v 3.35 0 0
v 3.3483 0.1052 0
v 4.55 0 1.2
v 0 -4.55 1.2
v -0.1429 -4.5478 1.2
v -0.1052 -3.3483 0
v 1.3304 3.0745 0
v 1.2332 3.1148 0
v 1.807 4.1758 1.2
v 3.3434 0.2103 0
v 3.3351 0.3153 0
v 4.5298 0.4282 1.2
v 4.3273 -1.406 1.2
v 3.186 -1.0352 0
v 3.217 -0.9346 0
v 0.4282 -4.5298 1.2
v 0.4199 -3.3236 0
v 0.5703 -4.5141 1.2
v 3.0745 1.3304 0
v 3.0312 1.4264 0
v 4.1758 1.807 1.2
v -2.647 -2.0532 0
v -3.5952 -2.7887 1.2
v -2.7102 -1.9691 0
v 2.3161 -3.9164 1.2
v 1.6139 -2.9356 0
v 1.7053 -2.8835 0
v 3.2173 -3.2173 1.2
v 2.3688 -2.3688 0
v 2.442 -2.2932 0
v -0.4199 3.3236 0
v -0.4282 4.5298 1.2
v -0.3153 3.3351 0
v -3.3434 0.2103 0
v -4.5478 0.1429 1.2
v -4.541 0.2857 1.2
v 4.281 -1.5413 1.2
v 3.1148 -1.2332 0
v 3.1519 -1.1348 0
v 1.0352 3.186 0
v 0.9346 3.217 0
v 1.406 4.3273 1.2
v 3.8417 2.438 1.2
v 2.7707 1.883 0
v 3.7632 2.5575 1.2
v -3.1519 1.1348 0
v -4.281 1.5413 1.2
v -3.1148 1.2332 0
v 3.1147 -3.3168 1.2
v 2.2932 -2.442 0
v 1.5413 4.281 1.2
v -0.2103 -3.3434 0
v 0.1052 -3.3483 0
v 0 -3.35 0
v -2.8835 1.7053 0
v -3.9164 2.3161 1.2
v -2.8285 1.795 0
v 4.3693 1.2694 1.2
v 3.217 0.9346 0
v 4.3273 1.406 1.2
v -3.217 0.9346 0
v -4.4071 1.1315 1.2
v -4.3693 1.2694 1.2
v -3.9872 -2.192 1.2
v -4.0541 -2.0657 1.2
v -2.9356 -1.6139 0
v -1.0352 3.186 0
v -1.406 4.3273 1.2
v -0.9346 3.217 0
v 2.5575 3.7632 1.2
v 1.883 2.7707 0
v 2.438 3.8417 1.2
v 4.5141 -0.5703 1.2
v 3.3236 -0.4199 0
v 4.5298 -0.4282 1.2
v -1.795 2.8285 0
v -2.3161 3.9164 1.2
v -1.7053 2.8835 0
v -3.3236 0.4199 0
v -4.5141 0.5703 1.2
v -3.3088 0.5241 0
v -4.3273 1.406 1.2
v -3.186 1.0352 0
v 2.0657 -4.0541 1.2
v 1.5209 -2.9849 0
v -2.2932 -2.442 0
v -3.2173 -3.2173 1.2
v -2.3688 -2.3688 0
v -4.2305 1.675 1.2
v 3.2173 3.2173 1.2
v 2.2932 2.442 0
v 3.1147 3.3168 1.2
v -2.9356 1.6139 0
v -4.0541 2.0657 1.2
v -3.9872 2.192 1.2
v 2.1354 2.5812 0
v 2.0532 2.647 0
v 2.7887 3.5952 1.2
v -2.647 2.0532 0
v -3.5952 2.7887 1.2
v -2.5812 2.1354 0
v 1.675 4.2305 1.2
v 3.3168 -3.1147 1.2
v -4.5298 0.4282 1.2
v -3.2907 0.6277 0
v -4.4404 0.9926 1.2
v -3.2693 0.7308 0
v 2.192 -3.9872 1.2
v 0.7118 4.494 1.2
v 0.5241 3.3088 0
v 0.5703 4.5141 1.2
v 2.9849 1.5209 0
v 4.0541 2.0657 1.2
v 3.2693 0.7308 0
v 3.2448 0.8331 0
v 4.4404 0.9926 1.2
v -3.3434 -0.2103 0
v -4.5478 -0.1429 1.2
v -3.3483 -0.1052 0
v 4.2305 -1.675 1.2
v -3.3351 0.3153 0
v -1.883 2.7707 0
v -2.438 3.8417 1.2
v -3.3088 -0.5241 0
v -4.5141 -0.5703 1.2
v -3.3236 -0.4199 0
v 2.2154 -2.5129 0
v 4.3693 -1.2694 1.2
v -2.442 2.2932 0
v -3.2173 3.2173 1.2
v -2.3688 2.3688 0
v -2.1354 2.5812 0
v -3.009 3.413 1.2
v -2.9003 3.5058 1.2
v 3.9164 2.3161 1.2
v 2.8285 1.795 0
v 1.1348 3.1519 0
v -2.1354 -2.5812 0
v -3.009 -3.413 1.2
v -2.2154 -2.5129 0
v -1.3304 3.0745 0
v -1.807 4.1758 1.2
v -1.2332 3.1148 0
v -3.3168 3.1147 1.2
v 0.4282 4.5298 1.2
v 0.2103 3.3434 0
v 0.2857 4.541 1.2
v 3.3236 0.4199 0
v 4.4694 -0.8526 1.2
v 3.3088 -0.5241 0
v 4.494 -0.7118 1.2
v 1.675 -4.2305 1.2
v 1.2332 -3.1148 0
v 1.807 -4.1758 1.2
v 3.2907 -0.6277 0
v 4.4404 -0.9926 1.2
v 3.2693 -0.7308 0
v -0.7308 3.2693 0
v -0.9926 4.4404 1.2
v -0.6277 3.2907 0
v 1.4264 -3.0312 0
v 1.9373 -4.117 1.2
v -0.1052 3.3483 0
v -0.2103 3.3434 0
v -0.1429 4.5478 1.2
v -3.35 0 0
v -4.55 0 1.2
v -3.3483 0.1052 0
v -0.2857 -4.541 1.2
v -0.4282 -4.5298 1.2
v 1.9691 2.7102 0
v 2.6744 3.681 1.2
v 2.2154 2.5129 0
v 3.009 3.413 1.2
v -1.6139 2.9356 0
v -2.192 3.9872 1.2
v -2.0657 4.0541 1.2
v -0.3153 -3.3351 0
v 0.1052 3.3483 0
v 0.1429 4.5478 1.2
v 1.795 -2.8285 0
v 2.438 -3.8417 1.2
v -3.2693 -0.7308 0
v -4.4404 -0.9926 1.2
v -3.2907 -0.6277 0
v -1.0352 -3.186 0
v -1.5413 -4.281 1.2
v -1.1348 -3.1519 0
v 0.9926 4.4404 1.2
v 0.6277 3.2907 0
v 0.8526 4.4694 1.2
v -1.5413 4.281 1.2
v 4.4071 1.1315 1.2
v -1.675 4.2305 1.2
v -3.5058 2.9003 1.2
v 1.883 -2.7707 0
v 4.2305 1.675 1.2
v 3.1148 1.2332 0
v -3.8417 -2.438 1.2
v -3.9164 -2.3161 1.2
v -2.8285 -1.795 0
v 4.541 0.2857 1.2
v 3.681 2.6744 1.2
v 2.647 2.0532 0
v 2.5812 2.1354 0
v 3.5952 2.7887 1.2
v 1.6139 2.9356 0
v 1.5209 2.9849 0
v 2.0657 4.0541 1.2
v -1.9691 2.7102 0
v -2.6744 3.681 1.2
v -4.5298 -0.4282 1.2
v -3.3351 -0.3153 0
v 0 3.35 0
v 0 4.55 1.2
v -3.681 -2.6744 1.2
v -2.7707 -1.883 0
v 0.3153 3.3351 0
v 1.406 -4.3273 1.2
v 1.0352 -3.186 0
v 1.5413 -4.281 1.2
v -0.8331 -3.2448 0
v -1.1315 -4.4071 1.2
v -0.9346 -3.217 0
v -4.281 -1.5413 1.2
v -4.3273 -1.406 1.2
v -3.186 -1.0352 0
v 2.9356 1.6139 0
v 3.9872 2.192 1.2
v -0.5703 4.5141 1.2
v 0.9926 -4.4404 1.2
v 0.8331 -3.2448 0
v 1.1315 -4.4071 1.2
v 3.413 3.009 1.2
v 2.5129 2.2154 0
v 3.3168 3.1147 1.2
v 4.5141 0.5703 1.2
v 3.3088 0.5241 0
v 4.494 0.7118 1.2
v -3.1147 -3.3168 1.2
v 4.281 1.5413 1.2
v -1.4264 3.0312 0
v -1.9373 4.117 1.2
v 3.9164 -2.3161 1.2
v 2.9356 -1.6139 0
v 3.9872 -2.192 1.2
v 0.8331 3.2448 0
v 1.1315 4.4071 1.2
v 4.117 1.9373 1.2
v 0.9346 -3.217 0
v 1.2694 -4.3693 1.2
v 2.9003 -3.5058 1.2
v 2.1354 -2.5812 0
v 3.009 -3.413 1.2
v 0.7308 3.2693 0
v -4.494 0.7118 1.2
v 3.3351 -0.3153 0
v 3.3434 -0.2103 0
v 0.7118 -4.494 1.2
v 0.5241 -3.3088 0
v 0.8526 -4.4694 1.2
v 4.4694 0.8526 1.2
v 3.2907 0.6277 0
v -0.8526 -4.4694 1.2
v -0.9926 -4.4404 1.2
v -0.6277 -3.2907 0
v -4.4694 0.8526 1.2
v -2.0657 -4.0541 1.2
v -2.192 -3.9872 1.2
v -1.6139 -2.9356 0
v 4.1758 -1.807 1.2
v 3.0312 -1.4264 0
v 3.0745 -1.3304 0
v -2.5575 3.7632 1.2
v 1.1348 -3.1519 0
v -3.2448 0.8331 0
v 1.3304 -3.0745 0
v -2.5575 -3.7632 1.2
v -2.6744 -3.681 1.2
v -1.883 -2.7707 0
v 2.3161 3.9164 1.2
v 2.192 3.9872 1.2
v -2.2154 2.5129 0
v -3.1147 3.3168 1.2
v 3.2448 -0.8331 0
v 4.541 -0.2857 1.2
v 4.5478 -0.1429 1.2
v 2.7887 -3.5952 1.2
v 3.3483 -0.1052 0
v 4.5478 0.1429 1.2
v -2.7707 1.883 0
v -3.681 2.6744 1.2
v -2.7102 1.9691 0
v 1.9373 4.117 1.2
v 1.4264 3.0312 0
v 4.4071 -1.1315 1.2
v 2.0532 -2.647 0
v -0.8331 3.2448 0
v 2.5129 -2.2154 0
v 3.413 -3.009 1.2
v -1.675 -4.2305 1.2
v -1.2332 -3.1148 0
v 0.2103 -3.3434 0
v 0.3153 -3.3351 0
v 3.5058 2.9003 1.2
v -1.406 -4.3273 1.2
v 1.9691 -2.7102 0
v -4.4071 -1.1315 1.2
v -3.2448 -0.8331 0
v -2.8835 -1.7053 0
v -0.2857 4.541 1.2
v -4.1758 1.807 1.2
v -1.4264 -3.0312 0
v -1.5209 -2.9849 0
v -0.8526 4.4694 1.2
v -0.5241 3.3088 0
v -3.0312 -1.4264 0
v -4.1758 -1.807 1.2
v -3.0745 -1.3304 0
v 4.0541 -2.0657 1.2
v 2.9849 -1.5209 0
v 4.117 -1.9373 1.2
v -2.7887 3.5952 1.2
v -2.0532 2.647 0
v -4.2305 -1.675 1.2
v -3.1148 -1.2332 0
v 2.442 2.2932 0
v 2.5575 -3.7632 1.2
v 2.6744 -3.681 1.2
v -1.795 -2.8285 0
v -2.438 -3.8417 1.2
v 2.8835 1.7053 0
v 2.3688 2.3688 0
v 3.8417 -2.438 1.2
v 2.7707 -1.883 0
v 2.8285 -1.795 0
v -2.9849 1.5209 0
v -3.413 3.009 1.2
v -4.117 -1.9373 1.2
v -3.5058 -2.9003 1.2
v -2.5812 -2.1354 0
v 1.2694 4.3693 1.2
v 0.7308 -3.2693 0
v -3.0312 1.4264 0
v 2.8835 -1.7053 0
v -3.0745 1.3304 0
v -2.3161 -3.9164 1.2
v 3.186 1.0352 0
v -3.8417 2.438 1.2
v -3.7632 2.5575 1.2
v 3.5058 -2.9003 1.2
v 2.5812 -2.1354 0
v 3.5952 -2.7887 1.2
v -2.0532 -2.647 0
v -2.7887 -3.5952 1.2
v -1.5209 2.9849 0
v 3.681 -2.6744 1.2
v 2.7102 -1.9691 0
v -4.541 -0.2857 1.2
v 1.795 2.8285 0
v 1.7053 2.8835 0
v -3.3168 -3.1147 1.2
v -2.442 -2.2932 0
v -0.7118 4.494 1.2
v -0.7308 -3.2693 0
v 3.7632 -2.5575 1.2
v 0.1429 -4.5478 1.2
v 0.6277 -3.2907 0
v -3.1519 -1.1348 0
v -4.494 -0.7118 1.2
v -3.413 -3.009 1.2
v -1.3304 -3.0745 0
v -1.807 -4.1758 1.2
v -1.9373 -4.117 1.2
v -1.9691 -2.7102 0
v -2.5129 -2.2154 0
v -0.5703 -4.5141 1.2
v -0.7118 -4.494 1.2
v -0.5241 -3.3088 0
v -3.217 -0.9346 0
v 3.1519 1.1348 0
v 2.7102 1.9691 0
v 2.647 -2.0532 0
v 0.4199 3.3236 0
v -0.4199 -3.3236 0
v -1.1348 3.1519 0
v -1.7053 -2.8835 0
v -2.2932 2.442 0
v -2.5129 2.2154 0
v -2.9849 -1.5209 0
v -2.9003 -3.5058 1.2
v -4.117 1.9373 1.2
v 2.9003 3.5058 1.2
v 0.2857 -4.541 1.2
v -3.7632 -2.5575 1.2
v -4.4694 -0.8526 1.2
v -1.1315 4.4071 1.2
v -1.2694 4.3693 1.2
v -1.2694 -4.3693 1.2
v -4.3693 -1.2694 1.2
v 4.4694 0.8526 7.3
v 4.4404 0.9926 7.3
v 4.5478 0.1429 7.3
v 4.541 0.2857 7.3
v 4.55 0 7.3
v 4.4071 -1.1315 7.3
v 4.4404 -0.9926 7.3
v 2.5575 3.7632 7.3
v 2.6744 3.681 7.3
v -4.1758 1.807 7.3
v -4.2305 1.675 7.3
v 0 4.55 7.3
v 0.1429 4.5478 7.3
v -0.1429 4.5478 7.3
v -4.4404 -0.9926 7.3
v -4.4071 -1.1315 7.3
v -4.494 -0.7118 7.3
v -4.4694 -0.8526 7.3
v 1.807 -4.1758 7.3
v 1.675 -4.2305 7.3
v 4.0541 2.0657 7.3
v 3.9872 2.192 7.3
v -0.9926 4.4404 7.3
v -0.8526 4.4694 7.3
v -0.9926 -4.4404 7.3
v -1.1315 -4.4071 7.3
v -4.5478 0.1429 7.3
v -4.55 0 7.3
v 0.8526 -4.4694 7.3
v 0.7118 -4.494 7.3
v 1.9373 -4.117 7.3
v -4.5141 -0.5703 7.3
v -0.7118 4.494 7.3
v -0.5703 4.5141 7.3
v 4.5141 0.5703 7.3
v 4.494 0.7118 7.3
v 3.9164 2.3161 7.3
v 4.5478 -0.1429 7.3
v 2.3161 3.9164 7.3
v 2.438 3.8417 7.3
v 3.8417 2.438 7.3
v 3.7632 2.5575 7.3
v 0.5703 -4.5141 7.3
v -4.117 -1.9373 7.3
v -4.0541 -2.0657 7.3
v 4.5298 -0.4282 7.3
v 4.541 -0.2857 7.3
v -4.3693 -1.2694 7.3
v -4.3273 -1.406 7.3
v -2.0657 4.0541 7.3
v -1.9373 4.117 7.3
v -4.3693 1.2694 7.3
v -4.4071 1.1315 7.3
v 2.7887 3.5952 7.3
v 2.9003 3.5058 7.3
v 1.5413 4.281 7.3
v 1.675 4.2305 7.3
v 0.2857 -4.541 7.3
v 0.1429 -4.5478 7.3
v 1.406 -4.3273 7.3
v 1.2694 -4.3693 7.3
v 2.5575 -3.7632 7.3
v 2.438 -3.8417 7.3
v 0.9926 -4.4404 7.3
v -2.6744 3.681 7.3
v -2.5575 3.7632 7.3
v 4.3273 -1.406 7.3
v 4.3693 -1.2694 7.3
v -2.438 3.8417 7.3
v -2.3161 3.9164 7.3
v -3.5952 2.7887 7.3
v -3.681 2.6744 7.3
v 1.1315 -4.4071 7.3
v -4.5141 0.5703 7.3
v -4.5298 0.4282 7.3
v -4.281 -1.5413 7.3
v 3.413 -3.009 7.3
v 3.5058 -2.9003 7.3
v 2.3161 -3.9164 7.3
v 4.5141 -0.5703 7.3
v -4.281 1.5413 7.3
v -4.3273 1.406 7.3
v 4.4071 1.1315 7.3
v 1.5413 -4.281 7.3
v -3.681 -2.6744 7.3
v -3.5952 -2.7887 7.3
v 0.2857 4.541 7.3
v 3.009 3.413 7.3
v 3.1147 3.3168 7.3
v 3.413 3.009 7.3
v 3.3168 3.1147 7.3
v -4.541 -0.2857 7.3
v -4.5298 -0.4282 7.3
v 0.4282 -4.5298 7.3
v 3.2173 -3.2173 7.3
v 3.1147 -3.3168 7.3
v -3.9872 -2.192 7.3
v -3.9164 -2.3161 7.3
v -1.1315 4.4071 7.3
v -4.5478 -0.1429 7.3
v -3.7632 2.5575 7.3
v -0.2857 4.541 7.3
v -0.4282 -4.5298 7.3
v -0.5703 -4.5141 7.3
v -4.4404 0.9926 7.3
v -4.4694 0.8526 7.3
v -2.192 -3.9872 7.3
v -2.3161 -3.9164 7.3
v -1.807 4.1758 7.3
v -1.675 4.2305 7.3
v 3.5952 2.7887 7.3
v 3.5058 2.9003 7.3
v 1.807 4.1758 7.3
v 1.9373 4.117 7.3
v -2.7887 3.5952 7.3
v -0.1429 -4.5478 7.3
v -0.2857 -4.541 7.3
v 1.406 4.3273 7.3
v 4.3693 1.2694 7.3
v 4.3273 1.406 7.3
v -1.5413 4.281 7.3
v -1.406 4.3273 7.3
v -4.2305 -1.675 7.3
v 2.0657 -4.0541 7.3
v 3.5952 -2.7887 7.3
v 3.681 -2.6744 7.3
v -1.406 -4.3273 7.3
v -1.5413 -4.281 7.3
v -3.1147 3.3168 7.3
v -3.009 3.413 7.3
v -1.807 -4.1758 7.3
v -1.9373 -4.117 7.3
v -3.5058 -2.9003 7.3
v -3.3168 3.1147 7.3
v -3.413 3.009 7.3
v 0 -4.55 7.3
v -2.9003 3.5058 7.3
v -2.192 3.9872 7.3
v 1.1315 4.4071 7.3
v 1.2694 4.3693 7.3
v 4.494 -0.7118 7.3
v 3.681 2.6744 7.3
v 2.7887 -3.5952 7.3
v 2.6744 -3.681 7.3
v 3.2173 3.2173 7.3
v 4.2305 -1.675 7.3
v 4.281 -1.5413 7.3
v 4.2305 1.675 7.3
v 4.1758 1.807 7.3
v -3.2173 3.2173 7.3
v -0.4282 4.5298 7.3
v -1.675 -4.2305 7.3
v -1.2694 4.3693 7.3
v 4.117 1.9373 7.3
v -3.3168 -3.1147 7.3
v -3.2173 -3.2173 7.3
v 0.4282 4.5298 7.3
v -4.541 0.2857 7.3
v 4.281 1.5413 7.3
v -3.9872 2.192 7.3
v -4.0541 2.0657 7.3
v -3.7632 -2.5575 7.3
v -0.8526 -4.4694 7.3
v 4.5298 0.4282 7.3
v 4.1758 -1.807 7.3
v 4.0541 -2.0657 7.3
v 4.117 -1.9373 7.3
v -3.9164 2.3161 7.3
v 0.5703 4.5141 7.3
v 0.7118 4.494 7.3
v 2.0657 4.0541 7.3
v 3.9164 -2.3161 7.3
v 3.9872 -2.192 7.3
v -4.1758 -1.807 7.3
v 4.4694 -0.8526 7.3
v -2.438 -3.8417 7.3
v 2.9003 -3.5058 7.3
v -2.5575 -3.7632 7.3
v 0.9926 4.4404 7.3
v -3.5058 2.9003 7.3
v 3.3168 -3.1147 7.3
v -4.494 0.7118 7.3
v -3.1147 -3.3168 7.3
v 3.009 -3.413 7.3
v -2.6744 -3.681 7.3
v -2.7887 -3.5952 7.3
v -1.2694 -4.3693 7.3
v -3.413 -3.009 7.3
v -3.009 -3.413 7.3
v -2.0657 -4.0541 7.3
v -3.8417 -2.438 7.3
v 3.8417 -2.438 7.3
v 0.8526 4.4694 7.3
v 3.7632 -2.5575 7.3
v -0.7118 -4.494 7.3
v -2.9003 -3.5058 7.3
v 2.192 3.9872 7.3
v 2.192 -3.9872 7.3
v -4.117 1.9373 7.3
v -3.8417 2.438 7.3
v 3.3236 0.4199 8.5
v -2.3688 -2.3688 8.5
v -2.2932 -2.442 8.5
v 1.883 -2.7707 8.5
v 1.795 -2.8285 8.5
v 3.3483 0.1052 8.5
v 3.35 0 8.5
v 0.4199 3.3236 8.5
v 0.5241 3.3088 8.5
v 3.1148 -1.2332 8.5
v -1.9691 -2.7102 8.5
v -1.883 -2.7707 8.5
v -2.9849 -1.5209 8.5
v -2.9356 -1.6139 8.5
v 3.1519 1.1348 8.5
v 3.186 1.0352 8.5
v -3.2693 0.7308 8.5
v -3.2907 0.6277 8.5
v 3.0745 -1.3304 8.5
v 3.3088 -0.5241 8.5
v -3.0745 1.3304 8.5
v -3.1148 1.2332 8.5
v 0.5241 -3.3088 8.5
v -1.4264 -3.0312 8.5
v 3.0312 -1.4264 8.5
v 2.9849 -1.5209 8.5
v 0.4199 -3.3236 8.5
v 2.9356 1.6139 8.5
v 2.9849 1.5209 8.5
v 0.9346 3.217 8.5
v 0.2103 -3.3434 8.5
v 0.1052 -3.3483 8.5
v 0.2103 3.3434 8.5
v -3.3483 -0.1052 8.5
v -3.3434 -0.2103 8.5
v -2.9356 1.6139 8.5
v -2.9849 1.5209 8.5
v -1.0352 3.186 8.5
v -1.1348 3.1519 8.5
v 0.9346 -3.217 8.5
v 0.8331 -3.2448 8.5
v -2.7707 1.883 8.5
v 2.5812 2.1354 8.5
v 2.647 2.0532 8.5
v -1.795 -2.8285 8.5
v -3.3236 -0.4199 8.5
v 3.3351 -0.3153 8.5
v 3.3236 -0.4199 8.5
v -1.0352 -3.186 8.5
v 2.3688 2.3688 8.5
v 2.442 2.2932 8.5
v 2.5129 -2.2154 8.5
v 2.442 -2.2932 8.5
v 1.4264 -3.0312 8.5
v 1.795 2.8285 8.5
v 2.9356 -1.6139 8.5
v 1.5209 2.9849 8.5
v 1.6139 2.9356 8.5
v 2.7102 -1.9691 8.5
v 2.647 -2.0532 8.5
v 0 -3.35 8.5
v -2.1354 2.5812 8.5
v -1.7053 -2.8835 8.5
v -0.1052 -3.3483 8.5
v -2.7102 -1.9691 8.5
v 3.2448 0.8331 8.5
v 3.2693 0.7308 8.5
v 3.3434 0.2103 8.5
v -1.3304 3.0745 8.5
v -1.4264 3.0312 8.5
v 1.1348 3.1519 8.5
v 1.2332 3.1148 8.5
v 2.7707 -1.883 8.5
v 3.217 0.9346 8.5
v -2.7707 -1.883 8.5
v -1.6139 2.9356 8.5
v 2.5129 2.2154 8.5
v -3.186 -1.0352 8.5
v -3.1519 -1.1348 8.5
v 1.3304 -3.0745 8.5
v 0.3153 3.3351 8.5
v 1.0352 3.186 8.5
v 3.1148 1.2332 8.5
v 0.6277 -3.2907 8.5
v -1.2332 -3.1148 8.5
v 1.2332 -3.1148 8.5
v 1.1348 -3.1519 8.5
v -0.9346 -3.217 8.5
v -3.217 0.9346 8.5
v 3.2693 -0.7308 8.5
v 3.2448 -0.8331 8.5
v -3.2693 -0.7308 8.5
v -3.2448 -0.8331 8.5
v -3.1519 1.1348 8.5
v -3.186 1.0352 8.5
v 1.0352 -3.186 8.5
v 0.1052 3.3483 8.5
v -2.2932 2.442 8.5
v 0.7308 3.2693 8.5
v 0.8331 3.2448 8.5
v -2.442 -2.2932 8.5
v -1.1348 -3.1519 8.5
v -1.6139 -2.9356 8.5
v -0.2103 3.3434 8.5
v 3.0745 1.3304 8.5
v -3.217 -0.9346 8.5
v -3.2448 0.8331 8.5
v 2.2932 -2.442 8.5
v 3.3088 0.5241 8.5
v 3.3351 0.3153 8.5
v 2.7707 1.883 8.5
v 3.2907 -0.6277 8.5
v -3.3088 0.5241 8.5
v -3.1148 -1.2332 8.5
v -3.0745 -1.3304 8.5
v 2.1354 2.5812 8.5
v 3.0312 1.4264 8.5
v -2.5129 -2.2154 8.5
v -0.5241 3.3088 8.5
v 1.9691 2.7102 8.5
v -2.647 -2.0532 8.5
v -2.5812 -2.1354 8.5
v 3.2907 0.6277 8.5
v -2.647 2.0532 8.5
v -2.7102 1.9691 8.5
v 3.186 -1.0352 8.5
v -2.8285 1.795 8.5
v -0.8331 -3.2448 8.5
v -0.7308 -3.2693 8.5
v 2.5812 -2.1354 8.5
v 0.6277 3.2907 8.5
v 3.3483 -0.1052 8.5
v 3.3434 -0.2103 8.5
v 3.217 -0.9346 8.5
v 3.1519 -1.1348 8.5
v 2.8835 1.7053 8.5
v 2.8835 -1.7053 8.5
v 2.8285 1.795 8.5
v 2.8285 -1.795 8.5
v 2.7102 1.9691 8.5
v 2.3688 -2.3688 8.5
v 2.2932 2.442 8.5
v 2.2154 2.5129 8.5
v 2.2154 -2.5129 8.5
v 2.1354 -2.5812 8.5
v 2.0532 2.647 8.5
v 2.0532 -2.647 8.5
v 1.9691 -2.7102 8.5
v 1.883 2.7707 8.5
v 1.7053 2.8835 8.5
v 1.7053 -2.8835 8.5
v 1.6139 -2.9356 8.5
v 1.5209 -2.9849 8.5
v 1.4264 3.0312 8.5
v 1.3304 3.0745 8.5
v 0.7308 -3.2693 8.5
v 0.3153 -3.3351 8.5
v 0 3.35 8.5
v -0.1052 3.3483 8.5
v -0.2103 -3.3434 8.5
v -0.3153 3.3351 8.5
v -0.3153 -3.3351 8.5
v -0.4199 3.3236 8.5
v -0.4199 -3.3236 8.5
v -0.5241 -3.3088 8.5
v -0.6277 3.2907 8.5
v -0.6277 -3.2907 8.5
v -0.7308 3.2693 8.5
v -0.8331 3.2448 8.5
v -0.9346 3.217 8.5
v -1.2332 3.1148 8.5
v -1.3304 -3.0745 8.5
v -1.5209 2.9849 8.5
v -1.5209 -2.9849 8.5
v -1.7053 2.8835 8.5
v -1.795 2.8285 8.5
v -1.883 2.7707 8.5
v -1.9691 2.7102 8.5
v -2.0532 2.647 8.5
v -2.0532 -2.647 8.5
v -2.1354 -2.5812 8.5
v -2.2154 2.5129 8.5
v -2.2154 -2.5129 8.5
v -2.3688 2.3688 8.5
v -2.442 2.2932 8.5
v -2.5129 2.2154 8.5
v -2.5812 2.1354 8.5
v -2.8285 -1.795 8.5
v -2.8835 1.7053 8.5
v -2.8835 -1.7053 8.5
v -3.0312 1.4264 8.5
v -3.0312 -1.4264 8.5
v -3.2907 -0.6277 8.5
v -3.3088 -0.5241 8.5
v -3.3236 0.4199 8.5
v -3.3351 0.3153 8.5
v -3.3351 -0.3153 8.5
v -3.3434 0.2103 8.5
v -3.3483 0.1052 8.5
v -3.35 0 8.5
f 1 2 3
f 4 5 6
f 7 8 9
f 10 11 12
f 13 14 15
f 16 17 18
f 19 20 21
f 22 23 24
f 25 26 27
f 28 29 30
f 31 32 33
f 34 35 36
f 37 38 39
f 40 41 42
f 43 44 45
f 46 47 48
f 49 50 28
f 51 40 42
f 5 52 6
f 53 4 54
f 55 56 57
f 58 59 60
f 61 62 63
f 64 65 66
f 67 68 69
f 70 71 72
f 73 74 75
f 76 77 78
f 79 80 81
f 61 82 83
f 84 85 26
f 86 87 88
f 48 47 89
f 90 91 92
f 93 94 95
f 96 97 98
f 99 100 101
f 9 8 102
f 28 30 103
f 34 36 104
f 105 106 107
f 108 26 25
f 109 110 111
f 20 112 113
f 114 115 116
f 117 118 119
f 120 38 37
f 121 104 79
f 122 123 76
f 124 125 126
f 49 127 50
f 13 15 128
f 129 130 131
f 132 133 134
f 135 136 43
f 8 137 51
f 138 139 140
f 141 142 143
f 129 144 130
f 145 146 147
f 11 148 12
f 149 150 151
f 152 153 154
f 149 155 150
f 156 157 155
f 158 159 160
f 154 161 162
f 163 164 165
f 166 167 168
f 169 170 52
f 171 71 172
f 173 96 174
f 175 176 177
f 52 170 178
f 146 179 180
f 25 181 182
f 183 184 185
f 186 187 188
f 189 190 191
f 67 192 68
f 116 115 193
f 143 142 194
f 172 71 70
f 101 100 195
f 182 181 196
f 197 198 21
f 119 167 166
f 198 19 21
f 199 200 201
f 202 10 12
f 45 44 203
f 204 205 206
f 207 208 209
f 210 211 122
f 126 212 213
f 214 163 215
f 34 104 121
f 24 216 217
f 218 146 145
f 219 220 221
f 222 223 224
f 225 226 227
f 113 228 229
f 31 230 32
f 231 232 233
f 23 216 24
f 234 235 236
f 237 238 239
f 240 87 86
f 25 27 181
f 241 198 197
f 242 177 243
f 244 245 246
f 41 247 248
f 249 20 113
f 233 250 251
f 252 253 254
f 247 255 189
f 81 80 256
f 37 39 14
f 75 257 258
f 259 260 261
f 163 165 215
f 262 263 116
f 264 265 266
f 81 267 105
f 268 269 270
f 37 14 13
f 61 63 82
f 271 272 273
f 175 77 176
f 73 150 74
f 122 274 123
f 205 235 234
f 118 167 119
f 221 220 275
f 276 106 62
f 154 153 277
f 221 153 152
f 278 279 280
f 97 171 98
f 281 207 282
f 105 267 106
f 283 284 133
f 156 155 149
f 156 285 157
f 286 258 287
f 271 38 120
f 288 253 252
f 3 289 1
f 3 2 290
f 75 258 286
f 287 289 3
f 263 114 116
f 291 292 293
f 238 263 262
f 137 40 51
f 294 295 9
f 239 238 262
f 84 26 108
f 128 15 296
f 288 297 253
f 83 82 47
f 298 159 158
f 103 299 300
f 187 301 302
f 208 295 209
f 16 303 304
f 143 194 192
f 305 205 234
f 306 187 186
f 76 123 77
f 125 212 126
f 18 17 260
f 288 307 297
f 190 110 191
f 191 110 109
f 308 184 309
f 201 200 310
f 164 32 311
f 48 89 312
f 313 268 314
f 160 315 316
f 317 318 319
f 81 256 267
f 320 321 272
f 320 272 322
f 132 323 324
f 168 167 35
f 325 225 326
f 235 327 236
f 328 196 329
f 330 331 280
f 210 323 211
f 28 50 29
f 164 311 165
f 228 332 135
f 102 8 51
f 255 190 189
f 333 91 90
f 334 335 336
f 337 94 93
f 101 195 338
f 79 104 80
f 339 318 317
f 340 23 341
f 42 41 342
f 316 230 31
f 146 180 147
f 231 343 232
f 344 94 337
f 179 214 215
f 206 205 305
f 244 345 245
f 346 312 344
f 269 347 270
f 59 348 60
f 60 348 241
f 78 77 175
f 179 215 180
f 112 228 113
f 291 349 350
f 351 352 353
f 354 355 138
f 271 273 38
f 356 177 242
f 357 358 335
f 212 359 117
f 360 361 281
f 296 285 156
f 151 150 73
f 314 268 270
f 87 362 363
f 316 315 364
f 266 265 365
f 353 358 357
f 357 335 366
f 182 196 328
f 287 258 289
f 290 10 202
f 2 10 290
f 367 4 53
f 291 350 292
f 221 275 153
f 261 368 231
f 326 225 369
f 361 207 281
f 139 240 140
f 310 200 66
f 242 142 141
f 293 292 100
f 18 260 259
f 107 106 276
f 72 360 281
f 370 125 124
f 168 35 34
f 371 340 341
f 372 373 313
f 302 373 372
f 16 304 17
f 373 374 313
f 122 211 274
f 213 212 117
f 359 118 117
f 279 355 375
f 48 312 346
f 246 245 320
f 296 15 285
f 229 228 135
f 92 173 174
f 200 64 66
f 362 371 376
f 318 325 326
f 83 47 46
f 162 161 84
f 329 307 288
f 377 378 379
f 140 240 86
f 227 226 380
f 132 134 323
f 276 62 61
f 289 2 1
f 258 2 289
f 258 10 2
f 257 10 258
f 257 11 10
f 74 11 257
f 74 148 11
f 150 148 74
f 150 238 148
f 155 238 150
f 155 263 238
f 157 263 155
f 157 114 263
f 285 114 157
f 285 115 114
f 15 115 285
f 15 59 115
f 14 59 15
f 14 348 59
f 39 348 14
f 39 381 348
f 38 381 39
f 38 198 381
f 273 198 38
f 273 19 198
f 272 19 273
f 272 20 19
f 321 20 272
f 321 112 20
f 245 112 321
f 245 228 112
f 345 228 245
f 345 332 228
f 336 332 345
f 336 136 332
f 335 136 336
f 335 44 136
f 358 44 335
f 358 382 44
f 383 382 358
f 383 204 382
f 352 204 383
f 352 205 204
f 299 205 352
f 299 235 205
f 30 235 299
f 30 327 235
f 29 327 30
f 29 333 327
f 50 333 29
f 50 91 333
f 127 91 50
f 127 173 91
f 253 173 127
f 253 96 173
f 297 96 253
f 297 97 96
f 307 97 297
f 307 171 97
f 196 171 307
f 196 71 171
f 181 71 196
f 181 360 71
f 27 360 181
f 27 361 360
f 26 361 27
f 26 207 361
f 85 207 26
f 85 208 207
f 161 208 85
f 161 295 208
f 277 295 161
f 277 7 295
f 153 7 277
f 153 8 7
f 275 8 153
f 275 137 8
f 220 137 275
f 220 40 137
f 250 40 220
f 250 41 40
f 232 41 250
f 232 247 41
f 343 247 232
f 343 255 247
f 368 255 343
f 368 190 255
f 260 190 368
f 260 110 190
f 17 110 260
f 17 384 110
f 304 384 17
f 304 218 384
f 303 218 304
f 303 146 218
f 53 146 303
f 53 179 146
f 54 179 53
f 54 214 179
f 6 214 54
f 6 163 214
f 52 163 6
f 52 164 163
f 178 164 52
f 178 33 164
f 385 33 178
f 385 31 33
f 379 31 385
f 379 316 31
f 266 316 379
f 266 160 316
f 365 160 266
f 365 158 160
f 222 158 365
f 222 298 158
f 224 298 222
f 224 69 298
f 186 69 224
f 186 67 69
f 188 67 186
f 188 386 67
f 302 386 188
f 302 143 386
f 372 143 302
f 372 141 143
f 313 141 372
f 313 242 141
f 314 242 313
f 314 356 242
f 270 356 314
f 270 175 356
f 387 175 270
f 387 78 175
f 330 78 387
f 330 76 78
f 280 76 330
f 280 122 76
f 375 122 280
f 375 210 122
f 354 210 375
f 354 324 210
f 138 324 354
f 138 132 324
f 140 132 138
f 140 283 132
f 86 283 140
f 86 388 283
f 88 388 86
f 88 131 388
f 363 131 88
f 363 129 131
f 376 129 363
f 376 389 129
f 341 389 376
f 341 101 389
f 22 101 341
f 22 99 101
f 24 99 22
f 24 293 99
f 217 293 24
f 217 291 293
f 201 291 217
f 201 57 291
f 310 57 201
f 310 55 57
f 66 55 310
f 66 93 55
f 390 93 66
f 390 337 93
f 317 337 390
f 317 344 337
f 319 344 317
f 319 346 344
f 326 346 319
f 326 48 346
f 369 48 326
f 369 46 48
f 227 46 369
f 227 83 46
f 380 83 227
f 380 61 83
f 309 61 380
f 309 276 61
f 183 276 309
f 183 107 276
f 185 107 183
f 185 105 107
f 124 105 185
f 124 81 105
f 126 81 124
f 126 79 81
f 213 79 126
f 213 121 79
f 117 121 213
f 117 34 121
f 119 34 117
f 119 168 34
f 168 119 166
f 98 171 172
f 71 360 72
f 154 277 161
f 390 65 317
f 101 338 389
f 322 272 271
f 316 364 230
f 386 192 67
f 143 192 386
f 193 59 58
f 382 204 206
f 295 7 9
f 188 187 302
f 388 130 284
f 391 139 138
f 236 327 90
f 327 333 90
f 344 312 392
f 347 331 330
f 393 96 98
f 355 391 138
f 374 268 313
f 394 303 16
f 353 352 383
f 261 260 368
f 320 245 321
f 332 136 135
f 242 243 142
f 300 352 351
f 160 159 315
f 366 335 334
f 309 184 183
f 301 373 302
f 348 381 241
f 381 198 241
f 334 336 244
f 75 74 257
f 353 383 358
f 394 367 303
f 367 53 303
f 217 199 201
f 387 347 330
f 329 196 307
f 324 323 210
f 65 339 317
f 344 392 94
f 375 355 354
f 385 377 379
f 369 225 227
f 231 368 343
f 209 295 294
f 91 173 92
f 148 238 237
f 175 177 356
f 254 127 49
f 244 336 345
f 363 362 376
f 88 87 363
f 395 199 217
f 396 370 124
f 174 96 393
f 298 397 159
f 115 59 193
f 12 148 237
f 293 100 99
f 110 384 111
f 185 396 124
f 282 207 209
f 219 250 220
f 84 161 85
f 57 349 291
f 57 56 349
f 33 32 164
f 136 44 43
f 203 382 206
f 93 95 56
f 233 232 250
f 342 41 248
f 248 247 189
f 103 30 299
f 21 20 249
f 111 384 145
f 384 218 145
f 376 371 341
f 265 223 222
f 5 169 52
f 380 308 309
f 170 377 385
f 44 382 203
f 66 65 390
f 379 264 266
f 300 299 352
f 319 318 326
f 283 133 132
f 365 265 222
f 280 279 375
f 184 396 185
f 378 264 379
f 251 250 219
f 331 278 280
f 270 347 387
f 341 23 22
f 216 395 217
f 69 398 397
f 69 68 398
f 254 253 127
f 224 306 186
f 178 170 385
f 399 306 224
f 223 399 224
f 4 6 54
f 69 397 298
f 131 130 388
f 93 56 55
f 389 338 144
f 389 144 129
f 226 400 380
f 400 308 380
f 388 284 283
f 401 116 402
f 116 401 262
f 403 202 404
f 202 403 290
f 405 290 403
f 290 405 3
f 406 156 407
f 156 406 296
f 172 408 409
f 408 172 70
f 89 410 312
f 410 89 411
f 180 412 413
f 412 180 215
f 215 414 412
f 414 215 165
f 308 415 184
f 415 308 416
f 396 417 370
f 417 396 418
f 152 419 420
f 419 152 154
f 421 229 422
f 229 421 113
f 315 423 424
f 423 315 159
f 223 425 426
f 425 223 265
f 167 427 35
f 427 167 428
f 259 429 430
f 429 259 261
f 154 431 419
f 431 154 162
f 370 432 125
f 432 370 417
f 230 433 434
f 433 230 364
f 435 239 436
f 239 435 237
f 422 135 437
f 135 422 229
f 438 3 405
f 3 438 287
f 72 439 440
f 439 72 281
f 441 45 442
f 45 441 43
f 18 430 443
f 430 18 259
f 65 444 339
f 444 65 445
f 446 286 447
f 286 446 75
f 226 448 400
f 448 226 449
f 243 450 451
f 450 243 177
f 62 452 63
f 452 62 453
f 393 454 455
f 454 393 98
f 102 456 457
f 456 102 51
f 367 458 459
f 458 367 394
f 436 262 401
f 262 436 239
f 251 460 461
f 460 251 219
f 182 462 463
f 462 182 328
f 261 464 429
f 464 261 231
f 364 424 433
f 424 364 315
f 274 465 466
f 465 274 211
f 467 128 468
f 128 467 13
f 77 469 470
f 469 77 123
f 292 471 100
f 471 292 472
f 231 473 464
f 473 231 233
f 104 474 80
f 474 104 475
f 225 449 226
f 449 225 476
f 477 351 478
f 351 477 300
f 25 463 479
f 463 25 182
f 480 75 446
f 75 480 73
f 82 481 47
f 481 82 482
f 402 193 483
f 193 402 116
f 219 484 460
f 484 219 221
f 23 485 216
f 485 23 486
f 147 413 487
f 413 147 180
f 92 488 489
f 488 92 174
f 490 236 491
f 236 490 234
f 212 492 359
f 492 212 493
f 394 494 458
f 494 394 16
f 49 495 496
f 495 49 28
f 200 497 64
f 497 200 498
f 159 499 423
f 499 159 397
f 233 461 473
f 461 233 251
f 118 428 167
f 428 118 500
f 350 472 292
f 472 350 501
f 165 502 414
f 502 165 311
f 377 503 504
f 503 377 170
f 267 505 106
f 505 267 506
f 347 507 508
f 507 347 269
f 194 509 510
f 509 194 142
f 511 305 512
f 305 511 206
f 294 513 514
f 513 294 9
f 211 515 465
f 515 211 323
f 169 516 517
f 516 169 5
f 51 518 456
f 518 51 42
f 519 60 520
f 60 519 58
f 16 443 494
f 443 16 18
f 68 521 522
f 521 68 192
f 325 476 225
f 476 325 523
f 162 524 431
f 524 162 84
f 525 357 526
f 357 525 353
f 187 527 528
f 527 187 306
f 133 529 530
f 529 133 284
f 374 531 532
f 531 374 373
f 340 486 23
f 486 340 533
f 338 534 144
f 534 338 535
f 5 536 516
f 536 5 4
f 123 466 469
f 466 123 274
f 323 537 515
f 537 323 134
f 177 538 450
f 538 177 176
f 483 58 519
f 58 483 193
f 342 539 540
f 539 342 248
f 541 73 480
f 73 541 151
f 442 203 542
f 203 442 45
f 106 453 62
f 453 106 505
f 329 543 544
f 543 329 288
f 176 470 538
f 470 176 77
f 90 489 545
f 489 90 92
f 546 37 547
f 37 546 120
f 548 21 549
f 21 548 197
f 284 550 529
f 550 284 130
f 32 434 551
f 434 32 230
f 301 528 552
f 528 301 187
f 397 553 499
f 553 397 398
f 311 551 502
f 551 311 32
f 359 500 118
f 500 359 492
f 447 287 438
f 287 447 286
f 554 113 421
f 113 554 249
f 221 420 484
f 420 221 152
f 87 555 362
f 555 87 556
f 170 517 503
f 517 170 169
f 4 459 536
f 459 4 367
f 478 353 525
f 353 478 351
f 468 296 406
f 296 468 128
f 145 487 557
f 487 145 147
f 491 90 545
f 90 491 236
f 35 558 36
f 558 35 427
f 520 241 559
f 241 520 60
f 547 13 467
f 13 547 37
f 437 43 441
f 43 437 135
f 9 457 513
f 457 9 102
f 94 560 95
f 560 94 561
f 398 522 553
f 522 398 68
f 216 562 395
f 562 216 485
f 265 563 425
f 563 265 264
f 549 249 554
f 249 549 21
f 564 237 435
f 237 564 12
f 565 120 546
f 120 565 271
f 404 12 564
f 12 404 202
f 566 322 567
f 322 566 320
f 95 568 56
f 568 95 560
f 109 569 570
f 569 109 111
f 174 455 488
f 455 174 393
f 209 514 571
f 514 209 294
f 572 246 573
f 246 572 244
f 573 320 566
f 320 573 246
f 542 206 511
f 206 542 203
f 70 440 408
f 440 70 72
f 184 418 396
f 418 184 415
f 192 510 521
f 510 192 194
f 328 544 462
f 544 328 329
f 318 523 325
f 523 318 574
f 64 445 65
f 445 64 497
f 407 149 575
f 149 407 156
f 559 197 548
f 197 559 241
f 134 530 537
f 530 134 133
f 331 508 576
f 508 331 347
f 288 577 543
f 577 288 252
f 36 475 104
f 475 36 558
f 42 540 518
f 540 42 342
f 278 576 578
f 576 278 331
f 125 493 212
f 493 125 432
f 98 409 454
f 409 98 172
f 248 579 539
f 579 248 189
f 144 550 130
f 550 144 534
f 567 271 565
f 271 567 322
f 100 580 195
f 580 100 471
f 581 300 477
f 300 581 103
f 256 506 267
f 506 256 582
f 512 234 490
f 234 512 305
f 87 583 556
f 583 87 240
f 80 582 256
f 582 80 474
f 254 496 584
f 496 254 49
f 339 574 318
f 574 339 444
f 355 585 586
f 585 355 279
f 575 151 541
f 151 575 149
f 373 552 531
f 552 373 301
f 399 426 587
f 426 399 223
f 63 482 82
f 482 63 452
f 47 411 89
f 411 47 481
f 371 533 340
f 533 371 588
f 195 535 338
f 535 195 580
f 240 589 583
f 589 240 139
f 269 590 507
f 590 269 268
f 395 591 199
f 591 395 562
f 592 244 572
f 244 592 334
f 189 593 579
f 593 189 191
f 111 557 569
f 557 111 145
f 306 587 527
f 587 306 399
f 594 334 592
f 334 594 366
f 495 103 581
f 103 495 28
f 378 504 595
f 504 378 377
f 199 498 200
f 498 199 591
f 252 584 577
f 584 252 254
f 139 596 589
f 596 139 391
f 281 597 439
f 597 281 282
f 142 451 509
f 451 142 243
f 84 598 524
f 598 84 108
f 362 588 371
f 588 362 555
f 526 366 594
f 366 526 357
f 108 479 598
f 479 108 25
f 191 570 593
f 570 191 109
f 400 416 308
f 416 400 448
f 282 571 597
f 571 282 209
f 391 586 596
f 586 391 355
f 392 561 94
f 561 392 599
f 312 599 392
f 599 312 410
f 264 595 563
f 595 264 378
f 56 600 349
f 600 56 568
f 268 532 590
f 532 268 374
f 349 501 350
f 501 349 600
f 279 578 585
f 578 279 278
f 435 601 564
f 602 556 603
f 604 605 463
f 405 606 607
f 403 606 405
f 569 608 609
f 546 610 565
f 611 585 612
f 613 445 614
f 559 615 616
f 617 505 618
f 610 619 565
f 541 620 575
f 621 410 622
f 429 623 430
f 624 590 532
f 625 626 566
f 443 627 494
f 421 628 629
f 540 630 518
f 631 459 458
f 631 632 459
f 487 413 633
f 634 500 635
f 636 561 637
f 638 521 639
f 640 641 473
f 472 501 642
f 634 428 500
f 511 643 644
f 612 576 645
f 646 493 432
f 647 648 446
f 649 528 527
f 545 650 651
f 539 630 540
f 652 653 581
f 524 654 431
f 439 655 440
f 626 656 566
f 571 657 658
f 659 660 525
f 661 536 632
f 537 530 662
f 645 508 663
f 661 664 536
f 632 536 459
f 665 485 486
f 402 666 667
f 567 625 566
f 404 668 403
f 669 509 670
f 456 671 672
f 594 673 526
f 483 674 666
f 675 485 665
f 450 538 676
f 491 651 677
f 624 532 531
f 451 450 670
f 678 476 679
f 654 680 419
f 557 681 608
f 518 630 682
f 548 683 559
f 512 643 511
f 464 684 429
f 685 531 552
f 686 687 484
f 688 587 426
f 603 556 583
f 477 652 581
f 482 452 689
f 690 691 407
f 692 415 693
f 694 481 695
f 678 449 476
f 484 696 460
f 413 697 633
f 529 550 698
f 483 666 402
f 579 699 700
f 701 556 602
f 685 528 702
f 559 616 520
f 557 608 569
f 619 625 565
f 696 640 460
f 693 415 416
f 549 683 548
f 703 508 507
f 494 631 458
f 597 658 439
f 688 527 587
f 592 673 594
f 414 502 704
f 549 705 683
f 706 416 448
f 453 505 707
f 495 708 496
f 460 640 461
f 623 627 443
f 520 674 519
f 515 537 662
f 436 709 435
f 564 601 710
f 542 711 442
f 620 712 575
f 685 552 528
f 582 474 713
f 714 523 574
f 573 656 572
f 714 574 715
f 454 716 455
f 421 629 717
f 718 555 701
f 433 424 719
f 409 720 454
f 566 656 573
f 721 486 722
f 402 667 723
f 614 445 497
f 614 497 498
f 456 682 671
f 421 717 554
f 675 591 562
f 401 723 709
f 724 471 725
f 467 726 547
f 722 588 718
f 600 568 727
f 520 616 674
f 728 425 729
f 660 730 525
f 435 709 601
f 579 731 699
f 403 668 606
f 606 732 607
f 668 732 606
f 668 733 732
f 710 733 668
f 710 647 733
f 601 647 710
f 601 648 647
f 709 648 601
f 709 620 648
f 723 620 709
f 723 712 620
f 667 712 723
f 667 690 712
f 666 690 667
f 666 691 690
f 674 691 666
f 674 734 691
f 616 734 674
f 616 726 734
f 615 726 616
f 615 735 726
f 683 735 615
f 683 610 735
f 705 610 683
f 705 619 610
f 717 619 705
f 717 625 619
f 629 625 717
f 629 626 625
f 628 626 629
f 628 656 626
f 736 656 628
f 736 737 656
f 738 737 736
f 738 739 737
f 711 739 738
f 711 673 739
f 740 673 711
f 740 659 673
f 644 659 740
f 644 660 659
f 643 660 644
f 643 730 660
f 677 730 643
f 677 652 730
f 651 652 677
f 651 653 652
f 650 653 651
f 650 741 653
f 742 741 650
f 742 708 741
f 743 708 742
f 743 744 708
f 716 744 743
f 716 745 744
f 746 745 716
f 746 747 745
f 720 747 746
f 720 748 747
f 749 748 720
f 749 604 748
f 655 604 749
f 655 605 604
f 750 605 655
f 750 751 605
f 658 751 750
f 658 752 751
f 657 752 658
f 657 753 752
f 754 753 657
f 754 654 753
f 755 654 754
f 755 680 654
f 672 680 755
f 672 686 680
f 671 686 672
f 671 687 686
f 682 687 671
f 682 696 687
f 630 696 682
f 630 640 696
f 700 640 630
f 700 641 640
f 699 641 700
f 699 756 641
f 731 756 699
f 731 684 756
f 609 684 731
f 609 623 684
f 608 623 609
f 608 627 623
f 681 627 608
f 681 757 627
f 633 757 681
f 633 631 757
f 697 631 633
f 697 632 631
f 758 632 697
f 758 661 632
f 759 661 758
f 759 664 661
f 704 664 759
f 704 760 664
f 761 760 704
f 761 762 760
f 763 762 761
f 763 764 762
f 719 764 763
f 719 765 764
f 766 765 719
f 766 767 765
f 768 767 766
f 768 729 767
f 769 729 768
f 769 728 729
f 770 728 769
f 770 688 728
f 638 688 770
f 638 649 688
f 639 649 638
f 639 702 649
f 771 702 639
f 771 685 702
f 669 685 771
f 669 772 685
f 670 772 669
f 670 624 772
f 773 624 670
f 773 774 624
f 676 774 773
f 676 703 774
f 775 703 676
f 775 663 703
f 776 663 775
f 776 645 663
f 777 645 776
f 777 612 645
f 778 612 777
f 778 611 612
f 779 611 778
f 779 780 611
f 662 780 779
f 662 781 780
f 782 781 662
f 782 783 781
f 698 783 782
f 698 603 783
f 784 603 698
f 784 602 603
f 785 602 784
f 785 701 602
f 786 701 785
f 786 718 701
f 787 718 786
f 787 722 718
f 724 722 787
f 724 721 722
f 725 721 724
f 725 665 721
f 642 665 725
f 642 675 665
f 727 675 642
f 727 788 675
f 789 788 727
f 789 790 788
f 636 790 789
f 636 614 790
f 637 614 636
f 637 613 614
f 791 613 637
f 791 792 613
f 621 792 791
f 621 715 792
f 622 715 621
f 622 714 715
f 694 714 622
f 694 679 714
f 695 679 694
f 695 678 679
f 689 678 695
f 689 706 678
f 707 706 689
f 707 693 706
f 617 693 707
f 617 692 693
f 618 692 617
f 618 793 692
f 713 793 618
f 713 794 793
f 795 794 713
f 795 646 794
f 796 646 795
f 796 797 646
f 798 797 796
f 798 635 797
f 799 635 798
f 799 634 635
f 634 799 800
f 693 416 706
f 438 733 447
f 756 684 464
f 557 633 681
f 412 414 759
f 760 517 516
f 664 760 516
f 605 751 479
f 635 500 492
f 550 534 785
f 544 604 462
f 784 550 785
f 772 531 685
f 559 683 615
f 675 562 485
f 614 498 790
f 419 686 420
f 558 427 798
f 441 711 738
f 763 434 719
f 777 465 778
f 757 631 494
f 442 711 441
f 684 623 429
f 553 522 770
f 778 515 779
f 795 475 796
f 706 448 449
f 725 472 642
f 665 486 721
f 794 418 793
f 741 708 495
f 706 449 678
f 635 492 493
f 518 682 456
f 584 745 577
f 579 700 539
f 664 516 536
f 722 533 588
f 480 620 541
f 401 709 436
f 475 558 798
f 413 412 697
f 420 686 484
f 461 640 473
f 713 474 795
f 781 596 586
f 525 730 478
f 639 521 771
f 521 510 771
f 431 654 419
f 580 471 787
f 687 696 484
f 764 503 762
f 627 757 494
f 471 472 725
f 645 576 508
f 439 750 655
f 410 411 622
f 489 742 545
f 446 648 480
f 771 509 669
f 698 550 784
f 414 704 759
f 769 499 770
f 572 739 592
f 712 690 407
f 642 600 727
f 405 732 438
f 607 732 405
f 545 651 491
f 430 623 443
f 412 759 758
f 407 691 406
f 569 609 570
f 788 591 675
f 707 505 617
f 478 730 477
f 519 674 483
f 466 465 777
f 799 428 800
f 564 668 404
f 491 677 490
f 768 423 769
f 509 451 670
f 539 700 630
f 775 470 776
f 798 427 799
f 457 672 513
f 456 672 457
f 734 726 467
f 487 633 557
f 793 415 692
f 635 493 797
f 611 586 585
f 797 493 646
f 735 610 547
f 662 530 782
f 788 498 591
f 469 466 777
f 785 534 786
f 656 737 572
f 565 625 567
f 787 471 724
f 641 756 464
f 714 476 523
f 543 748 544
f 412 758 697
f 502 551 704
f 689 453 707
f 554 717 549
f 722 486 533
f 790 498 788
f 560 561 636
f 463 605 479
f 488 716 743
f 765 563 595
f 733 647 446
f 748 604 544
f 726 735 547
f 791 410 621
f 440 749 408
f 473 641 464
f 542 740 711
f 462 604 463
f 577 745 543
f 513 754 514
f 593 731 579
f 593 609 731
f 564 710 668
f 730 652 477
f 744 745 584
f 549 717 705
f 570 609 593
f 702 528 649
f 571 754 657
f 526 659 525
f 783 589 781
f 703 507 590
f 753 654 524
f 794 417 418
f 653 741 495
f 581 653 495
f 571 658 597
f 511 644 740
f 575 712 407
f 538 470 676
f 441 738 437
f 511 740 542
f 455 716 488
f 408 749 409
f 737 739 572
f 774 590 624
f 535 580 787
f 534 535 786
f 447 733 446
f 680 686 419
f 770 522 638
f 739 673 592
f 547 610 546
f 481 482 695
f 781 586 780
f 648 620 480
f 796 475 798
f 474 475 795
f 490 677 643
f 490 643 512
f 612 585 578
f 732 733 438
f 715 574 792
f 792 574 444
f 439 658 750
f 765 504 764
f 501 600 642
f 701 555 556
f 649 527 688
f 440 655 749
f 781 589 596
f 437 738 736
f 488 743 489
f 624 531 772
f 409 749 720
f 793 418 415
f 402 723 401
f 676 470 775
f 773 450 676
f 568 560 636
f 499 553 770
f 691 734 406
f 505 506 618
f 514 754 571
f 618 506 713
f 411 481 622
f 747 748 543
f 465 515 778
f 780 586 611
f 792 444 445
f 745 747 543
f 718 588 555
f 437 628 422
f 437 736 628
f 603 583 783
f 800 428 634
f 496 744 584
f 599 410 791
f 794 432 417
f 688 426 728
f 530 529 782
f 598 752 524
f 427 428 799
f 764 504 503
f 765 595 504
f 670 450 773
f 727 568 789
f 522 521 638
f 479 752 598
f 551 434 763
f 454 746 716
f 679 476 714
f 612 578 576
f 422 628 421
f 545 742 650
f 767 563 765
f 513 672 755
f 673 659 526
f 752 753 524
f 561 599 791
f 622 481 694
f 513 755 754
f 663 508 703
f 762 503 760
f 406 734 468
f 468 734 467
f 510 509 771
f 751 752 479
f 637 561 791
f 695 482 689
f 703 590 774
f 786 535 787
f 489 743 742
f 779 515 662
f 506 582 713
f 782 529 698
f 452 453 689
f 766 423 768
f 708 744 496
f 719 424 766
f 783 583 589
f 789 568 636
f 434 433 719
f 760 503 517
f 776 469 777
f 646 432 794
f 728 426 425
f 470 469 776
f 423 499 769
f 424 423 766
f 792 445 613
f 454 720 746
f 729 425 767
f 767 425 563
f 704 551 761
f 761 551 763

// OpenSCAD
// slew1
// slewing joint with cross roller bearings


F1=200;              // $fn for rollers
F2=44;              // $fn for less critical

// TEST !!
//rod=9.0;           // roller outer diameter
// 9.0 too loose, #5 build first solid
rod=9.1;           // roller outer diameter

rid=5.8;            //  roller inner diameter
//rhi=rod-0.5;      // roller height
rhi=rod-0.6;      // roller height

rbevel=1.2;           // z height of bevels
Nr = 6;            // half the number rollers

ofill=0;        // outer race fillet
ood=36-ofill;        // outer race outer rad
oid=10+ofill;         // outer race inner rad
ohi=14-2*ofill;         // outer race height

iooff=0.51;     // offset race in the boss

iogap=4;        // inner outer gap

Nholei=8;     // number holes inner
rholei=1.55;     // radius of holes inner
oholei=3;       // offset from edge

Nholeo=8;     // number holes inner
rholeo=1.55;     // radius of holes inner
oholeo=3;       // offset from edge

//CutAngle=180/Nr;   // cutaway view if < 360
CutAngle=360;   // cutaway view if < 360

//-------------------------------
module roller1(tol=0){

difference(){
union(){
    // boss is stack of 3 cylinders
    translate([0,0,-tol])
    cylinder(r1=rod/2-rbevel,  r2=rod/2+tol, h=rbevel+tol, $fn=F1);

    translate([0,0,rbevel])
    cylinder(r=rod/2+tol, h=rhi-2*rbevel, $fn=F1);
        
    translate([0,0,rhi-rbevel])
    cylinder(r1=rod/2+tol,  r2=rod/2-rbevel, h=rbevel, $fn=F1);
}


}
}

//-------------------------------
module roller1cut(tol=0){

difference(){
union(){
    translate([0,0,rbevel])
    cylinder(r=rod/2+tol, h=rhi-2*rbevel, $fn=F1);
}


}
}


//------------------------------------
module ring1(tol=0.1){
    
    difference(){
        union(){
        // main ring
        rotate_extrude(angle=CutAngle,$fn=F1){
        translate([(ood+oid)/2,0,0])
        //offset(r=ofill,$fn=F2)
        square([ood-oid,ohi],center=true);
        }

    } // end union
    
        // cut for races
        rotate_extrude($fn=F1){
        translate([(ood+oid)*iooff,0,0])
        rotate([0,0,45])
        offset(r=rbevel,$fn=F2)
        square([rod-rbevel*2+tol,
            rod-rbevel*2+tol],center=true);
        }
        
        // cut for bolts inner
        for(i=[0:Nholei-1]){
            rotate([0,0,360/Nholei*i])
            translate([oid+oholei,0,-1])
            cylinder(r=rholei,h=ohi*2,center=true,$fn=16);
        }

    }
}

//---------------------------------
module outer1(){

lip=0;
    
    difference(){
        union(){
        ring1();  

        color("cyan")
        translate([0,0,ohi/2+1])
        cylinder(r1=ood+lip,r2=ood+lip,h=2,center=true,$fn=F1);
    }// end union
    
    // cut for outer ring
    cylinder(r=(ood+oid)*iooff+iogap/2,h=ohi*3,center=true,$fn=F1);
    

    // cut for bolts outer
    for(i=[0:Nholeo-1]){
        rotate([0,0,360/Nholeo*i])
        translate([ood-oholeo,0,-1])
        cylinder(r=rholeo,h=ohi*2,center=true,$fn=16);
    }

    // cut for bolt heads
    for(i=[0:Nholeo-1]){
        rotate([0,0,360/Nholeo*i])
        translate([ood-oholeo,0,-ohi/2-1])
        cylinder(r=2.9,h=5,$fn=16);
    }

    
    translate([(ood+oid)/2+5.5,13,-ohi/2-0.2])
color("red")
    rotate([0,0,-65])
    linear_extrude(height=0.8){
        rotate([180,0,0])
    text("5", font = "Open Sans:style=Bold", size=6,halign="center",valign="center",spacing=1.1);
    }
}// end diff

}
//---------------------------------
module inner1(){
    
    intersection(){
        ring1();  
        // cut for inner ring
        cylinder(r=(ood+oid)*iooff-iogap/2,h=ohi*3,center=true,$fn=F1);
    }   
    
}
//-----------------------------------
module innerLow(tol=0.1){
    difference(){
        inner1();
        
        translate([-ood,-ood,-tol])
        cube([ood*2,ood*2,20]);

    }
 
difference(){
    color("orange")
        translate([0,0,-ohi/2-2])
        difference(){
            union(){
            cylinder(r=(ood+oid)*iooff+iogap/2+3,h=3,center=true,$fn=F2);
                translate([0,0,2])
            cylinder(r=(ood+oid)*iooff-iogap/2,h=1,center=true,$fn=F2);
            }
            
            cylinder(r=oid,h=6,center=true,$fn=F1);

       // cut for bolts inner
        for(i=[0:Nholei-1]){
            rotate([0,0,360/Nholei*i])
            translate([oid+oholei,0,-1])
            cylinder(r=rholei,h=ohi*2,center=true,$fn=16);
        }

        // cuts for bolt heads
        if(1){
        for(i=[0:Nholei-1]){
            rotate([0,0,360/Nholei*i]){
            translate([oid+oholei,0,-0.1])
            cylinder(r=2.9,h=3.0,center=true,$fn=16);
            translate([oid+oholei,0,1.6])
            cylinder(r1=2.9,r2=1.55,h=1,center=true,$fn=16);
            }
        }
    }
                




        }
        
    translate([(ood+oid)/2-1,8,-ohi/2-4])
color("red")
    rotate([0,0,-65])
    linear_extrude(height=0.8){
        rotate([180,0,0])
    text("5", font = "Open Sans:style=Bold", size=6,halign="center",valign="center",spacing=1.1);
    }
        
    }
    
 }

//-----------------------------------
module innerHi(tol=0.1){
    difference(){
    intersection(){
        inner1();
        
        translate([-ood,-ood,+tol])
        cube([ood*2,ood*2,20]);
    }


        // cut for bolt heads
    if(0){
        for(i=[0:Nholei-1]){
            rotate([0,0,360/Nholei*i])
            translate([oid+oholei,0,ohi/2-4])
            cylinder(r=3,h=4,$fn=F2);
        }
    }

    translate([(ood+oid)/2-9,6,ohi/2-0.2])
color("red")
    rotate([0,0,-65])
    linear_extrude(height=0.8){
        rotate([0,0,0])
    text("5", font = "Open Sans:style=Bold", size=6,halign="center",valign="center",spacing=1.1);
    }
}
}

//--------------------------------
module gasket(){
    intersection(){
    inner1();
    cylinder(r=30,h=0.2,center=true);
}
}


//--------------------------------
module carrier2(tol=-0.25){
    a1=360/Nr;
//    a1=360;
z0=ohi+2*ofill;
z1=0.0;     // clearance to top/bottom

tolR=0.25;  // radial tolerance to clear races    
    
difference(){ 
  union(){  
     difference(){
        // outer ring
        translate([0,0,z1])
            cylinder(r=(ood+oid)*iooff+iogap/2-tolR,h=z0-z1,center=true,$fn=F1);
                
        // cut for inner ring
        translate([0,0,-z1])
        cylinder(r=(ood+oid)*iooff-iogap/2+tolR,h=ohi*1.3,center=true,$fn=F1);
    }   
    }

c1=2;
    
for(i=[0:Nr-1]){
    rotate([0,0,360/Nr*i])

    color("red")
    translate([(ood+oid)*iooff,0,0])
    rotate([0,45,0])
    translate([0,0,-rhi/2-c1])
    cylinder(r=rod/2+0.3, h=rhi+2*c1, $fn=F1);

 }
for(i=[0:Nr-1]){
    rotate([0,0,360/Nr*i+180/Nr])

    color("green")
    translate([(ood+oid)*iooff,0,0])
    rotate([0,-45,0])
    translate([0,0,-rhi/2-c1])
    cylinder(r=rod/2+0.3, h=rhi+2*c1, $fn=F1);
}

// indicator cuts
    rotate([0,0,90/Nr])
    translate([(ood+oid)*iooff,0,ohi/2])
    rotate([45,0,0])
    cube([5,2,2],center=true);



}// end diff
}

//=================================

if(0){
difference(){
carrier();
translate([22,-13,0])
rotate([0,0,180/Nr])
cube([40,40,40],center=true);    
}
}

//carrier2();

if(0){
//for(i=[0]){
for(i=[0:Nr-1]){
    rotate([0,0,360/Nr*i])

    color("red")
    translate([(ood+oid)*iooff,0,0])
    rotate([0,45,0])
    translate([0,0,-rhi/2])
    roller1();
}
//for(i=[0]){
for(i=[0:Nr-1]){
    rotate([0,0,360/Nr*i+180/Nr])

    color("green")
    translate([(ood+oid)*iooff,0,0])
    rotate([0,-45,0])
    translate([0,0,-rhi/2])
    roller1();
}
}

roller1();

//ring1();

//outer1();

//innerHi();
//innerLow();

//gasket();
